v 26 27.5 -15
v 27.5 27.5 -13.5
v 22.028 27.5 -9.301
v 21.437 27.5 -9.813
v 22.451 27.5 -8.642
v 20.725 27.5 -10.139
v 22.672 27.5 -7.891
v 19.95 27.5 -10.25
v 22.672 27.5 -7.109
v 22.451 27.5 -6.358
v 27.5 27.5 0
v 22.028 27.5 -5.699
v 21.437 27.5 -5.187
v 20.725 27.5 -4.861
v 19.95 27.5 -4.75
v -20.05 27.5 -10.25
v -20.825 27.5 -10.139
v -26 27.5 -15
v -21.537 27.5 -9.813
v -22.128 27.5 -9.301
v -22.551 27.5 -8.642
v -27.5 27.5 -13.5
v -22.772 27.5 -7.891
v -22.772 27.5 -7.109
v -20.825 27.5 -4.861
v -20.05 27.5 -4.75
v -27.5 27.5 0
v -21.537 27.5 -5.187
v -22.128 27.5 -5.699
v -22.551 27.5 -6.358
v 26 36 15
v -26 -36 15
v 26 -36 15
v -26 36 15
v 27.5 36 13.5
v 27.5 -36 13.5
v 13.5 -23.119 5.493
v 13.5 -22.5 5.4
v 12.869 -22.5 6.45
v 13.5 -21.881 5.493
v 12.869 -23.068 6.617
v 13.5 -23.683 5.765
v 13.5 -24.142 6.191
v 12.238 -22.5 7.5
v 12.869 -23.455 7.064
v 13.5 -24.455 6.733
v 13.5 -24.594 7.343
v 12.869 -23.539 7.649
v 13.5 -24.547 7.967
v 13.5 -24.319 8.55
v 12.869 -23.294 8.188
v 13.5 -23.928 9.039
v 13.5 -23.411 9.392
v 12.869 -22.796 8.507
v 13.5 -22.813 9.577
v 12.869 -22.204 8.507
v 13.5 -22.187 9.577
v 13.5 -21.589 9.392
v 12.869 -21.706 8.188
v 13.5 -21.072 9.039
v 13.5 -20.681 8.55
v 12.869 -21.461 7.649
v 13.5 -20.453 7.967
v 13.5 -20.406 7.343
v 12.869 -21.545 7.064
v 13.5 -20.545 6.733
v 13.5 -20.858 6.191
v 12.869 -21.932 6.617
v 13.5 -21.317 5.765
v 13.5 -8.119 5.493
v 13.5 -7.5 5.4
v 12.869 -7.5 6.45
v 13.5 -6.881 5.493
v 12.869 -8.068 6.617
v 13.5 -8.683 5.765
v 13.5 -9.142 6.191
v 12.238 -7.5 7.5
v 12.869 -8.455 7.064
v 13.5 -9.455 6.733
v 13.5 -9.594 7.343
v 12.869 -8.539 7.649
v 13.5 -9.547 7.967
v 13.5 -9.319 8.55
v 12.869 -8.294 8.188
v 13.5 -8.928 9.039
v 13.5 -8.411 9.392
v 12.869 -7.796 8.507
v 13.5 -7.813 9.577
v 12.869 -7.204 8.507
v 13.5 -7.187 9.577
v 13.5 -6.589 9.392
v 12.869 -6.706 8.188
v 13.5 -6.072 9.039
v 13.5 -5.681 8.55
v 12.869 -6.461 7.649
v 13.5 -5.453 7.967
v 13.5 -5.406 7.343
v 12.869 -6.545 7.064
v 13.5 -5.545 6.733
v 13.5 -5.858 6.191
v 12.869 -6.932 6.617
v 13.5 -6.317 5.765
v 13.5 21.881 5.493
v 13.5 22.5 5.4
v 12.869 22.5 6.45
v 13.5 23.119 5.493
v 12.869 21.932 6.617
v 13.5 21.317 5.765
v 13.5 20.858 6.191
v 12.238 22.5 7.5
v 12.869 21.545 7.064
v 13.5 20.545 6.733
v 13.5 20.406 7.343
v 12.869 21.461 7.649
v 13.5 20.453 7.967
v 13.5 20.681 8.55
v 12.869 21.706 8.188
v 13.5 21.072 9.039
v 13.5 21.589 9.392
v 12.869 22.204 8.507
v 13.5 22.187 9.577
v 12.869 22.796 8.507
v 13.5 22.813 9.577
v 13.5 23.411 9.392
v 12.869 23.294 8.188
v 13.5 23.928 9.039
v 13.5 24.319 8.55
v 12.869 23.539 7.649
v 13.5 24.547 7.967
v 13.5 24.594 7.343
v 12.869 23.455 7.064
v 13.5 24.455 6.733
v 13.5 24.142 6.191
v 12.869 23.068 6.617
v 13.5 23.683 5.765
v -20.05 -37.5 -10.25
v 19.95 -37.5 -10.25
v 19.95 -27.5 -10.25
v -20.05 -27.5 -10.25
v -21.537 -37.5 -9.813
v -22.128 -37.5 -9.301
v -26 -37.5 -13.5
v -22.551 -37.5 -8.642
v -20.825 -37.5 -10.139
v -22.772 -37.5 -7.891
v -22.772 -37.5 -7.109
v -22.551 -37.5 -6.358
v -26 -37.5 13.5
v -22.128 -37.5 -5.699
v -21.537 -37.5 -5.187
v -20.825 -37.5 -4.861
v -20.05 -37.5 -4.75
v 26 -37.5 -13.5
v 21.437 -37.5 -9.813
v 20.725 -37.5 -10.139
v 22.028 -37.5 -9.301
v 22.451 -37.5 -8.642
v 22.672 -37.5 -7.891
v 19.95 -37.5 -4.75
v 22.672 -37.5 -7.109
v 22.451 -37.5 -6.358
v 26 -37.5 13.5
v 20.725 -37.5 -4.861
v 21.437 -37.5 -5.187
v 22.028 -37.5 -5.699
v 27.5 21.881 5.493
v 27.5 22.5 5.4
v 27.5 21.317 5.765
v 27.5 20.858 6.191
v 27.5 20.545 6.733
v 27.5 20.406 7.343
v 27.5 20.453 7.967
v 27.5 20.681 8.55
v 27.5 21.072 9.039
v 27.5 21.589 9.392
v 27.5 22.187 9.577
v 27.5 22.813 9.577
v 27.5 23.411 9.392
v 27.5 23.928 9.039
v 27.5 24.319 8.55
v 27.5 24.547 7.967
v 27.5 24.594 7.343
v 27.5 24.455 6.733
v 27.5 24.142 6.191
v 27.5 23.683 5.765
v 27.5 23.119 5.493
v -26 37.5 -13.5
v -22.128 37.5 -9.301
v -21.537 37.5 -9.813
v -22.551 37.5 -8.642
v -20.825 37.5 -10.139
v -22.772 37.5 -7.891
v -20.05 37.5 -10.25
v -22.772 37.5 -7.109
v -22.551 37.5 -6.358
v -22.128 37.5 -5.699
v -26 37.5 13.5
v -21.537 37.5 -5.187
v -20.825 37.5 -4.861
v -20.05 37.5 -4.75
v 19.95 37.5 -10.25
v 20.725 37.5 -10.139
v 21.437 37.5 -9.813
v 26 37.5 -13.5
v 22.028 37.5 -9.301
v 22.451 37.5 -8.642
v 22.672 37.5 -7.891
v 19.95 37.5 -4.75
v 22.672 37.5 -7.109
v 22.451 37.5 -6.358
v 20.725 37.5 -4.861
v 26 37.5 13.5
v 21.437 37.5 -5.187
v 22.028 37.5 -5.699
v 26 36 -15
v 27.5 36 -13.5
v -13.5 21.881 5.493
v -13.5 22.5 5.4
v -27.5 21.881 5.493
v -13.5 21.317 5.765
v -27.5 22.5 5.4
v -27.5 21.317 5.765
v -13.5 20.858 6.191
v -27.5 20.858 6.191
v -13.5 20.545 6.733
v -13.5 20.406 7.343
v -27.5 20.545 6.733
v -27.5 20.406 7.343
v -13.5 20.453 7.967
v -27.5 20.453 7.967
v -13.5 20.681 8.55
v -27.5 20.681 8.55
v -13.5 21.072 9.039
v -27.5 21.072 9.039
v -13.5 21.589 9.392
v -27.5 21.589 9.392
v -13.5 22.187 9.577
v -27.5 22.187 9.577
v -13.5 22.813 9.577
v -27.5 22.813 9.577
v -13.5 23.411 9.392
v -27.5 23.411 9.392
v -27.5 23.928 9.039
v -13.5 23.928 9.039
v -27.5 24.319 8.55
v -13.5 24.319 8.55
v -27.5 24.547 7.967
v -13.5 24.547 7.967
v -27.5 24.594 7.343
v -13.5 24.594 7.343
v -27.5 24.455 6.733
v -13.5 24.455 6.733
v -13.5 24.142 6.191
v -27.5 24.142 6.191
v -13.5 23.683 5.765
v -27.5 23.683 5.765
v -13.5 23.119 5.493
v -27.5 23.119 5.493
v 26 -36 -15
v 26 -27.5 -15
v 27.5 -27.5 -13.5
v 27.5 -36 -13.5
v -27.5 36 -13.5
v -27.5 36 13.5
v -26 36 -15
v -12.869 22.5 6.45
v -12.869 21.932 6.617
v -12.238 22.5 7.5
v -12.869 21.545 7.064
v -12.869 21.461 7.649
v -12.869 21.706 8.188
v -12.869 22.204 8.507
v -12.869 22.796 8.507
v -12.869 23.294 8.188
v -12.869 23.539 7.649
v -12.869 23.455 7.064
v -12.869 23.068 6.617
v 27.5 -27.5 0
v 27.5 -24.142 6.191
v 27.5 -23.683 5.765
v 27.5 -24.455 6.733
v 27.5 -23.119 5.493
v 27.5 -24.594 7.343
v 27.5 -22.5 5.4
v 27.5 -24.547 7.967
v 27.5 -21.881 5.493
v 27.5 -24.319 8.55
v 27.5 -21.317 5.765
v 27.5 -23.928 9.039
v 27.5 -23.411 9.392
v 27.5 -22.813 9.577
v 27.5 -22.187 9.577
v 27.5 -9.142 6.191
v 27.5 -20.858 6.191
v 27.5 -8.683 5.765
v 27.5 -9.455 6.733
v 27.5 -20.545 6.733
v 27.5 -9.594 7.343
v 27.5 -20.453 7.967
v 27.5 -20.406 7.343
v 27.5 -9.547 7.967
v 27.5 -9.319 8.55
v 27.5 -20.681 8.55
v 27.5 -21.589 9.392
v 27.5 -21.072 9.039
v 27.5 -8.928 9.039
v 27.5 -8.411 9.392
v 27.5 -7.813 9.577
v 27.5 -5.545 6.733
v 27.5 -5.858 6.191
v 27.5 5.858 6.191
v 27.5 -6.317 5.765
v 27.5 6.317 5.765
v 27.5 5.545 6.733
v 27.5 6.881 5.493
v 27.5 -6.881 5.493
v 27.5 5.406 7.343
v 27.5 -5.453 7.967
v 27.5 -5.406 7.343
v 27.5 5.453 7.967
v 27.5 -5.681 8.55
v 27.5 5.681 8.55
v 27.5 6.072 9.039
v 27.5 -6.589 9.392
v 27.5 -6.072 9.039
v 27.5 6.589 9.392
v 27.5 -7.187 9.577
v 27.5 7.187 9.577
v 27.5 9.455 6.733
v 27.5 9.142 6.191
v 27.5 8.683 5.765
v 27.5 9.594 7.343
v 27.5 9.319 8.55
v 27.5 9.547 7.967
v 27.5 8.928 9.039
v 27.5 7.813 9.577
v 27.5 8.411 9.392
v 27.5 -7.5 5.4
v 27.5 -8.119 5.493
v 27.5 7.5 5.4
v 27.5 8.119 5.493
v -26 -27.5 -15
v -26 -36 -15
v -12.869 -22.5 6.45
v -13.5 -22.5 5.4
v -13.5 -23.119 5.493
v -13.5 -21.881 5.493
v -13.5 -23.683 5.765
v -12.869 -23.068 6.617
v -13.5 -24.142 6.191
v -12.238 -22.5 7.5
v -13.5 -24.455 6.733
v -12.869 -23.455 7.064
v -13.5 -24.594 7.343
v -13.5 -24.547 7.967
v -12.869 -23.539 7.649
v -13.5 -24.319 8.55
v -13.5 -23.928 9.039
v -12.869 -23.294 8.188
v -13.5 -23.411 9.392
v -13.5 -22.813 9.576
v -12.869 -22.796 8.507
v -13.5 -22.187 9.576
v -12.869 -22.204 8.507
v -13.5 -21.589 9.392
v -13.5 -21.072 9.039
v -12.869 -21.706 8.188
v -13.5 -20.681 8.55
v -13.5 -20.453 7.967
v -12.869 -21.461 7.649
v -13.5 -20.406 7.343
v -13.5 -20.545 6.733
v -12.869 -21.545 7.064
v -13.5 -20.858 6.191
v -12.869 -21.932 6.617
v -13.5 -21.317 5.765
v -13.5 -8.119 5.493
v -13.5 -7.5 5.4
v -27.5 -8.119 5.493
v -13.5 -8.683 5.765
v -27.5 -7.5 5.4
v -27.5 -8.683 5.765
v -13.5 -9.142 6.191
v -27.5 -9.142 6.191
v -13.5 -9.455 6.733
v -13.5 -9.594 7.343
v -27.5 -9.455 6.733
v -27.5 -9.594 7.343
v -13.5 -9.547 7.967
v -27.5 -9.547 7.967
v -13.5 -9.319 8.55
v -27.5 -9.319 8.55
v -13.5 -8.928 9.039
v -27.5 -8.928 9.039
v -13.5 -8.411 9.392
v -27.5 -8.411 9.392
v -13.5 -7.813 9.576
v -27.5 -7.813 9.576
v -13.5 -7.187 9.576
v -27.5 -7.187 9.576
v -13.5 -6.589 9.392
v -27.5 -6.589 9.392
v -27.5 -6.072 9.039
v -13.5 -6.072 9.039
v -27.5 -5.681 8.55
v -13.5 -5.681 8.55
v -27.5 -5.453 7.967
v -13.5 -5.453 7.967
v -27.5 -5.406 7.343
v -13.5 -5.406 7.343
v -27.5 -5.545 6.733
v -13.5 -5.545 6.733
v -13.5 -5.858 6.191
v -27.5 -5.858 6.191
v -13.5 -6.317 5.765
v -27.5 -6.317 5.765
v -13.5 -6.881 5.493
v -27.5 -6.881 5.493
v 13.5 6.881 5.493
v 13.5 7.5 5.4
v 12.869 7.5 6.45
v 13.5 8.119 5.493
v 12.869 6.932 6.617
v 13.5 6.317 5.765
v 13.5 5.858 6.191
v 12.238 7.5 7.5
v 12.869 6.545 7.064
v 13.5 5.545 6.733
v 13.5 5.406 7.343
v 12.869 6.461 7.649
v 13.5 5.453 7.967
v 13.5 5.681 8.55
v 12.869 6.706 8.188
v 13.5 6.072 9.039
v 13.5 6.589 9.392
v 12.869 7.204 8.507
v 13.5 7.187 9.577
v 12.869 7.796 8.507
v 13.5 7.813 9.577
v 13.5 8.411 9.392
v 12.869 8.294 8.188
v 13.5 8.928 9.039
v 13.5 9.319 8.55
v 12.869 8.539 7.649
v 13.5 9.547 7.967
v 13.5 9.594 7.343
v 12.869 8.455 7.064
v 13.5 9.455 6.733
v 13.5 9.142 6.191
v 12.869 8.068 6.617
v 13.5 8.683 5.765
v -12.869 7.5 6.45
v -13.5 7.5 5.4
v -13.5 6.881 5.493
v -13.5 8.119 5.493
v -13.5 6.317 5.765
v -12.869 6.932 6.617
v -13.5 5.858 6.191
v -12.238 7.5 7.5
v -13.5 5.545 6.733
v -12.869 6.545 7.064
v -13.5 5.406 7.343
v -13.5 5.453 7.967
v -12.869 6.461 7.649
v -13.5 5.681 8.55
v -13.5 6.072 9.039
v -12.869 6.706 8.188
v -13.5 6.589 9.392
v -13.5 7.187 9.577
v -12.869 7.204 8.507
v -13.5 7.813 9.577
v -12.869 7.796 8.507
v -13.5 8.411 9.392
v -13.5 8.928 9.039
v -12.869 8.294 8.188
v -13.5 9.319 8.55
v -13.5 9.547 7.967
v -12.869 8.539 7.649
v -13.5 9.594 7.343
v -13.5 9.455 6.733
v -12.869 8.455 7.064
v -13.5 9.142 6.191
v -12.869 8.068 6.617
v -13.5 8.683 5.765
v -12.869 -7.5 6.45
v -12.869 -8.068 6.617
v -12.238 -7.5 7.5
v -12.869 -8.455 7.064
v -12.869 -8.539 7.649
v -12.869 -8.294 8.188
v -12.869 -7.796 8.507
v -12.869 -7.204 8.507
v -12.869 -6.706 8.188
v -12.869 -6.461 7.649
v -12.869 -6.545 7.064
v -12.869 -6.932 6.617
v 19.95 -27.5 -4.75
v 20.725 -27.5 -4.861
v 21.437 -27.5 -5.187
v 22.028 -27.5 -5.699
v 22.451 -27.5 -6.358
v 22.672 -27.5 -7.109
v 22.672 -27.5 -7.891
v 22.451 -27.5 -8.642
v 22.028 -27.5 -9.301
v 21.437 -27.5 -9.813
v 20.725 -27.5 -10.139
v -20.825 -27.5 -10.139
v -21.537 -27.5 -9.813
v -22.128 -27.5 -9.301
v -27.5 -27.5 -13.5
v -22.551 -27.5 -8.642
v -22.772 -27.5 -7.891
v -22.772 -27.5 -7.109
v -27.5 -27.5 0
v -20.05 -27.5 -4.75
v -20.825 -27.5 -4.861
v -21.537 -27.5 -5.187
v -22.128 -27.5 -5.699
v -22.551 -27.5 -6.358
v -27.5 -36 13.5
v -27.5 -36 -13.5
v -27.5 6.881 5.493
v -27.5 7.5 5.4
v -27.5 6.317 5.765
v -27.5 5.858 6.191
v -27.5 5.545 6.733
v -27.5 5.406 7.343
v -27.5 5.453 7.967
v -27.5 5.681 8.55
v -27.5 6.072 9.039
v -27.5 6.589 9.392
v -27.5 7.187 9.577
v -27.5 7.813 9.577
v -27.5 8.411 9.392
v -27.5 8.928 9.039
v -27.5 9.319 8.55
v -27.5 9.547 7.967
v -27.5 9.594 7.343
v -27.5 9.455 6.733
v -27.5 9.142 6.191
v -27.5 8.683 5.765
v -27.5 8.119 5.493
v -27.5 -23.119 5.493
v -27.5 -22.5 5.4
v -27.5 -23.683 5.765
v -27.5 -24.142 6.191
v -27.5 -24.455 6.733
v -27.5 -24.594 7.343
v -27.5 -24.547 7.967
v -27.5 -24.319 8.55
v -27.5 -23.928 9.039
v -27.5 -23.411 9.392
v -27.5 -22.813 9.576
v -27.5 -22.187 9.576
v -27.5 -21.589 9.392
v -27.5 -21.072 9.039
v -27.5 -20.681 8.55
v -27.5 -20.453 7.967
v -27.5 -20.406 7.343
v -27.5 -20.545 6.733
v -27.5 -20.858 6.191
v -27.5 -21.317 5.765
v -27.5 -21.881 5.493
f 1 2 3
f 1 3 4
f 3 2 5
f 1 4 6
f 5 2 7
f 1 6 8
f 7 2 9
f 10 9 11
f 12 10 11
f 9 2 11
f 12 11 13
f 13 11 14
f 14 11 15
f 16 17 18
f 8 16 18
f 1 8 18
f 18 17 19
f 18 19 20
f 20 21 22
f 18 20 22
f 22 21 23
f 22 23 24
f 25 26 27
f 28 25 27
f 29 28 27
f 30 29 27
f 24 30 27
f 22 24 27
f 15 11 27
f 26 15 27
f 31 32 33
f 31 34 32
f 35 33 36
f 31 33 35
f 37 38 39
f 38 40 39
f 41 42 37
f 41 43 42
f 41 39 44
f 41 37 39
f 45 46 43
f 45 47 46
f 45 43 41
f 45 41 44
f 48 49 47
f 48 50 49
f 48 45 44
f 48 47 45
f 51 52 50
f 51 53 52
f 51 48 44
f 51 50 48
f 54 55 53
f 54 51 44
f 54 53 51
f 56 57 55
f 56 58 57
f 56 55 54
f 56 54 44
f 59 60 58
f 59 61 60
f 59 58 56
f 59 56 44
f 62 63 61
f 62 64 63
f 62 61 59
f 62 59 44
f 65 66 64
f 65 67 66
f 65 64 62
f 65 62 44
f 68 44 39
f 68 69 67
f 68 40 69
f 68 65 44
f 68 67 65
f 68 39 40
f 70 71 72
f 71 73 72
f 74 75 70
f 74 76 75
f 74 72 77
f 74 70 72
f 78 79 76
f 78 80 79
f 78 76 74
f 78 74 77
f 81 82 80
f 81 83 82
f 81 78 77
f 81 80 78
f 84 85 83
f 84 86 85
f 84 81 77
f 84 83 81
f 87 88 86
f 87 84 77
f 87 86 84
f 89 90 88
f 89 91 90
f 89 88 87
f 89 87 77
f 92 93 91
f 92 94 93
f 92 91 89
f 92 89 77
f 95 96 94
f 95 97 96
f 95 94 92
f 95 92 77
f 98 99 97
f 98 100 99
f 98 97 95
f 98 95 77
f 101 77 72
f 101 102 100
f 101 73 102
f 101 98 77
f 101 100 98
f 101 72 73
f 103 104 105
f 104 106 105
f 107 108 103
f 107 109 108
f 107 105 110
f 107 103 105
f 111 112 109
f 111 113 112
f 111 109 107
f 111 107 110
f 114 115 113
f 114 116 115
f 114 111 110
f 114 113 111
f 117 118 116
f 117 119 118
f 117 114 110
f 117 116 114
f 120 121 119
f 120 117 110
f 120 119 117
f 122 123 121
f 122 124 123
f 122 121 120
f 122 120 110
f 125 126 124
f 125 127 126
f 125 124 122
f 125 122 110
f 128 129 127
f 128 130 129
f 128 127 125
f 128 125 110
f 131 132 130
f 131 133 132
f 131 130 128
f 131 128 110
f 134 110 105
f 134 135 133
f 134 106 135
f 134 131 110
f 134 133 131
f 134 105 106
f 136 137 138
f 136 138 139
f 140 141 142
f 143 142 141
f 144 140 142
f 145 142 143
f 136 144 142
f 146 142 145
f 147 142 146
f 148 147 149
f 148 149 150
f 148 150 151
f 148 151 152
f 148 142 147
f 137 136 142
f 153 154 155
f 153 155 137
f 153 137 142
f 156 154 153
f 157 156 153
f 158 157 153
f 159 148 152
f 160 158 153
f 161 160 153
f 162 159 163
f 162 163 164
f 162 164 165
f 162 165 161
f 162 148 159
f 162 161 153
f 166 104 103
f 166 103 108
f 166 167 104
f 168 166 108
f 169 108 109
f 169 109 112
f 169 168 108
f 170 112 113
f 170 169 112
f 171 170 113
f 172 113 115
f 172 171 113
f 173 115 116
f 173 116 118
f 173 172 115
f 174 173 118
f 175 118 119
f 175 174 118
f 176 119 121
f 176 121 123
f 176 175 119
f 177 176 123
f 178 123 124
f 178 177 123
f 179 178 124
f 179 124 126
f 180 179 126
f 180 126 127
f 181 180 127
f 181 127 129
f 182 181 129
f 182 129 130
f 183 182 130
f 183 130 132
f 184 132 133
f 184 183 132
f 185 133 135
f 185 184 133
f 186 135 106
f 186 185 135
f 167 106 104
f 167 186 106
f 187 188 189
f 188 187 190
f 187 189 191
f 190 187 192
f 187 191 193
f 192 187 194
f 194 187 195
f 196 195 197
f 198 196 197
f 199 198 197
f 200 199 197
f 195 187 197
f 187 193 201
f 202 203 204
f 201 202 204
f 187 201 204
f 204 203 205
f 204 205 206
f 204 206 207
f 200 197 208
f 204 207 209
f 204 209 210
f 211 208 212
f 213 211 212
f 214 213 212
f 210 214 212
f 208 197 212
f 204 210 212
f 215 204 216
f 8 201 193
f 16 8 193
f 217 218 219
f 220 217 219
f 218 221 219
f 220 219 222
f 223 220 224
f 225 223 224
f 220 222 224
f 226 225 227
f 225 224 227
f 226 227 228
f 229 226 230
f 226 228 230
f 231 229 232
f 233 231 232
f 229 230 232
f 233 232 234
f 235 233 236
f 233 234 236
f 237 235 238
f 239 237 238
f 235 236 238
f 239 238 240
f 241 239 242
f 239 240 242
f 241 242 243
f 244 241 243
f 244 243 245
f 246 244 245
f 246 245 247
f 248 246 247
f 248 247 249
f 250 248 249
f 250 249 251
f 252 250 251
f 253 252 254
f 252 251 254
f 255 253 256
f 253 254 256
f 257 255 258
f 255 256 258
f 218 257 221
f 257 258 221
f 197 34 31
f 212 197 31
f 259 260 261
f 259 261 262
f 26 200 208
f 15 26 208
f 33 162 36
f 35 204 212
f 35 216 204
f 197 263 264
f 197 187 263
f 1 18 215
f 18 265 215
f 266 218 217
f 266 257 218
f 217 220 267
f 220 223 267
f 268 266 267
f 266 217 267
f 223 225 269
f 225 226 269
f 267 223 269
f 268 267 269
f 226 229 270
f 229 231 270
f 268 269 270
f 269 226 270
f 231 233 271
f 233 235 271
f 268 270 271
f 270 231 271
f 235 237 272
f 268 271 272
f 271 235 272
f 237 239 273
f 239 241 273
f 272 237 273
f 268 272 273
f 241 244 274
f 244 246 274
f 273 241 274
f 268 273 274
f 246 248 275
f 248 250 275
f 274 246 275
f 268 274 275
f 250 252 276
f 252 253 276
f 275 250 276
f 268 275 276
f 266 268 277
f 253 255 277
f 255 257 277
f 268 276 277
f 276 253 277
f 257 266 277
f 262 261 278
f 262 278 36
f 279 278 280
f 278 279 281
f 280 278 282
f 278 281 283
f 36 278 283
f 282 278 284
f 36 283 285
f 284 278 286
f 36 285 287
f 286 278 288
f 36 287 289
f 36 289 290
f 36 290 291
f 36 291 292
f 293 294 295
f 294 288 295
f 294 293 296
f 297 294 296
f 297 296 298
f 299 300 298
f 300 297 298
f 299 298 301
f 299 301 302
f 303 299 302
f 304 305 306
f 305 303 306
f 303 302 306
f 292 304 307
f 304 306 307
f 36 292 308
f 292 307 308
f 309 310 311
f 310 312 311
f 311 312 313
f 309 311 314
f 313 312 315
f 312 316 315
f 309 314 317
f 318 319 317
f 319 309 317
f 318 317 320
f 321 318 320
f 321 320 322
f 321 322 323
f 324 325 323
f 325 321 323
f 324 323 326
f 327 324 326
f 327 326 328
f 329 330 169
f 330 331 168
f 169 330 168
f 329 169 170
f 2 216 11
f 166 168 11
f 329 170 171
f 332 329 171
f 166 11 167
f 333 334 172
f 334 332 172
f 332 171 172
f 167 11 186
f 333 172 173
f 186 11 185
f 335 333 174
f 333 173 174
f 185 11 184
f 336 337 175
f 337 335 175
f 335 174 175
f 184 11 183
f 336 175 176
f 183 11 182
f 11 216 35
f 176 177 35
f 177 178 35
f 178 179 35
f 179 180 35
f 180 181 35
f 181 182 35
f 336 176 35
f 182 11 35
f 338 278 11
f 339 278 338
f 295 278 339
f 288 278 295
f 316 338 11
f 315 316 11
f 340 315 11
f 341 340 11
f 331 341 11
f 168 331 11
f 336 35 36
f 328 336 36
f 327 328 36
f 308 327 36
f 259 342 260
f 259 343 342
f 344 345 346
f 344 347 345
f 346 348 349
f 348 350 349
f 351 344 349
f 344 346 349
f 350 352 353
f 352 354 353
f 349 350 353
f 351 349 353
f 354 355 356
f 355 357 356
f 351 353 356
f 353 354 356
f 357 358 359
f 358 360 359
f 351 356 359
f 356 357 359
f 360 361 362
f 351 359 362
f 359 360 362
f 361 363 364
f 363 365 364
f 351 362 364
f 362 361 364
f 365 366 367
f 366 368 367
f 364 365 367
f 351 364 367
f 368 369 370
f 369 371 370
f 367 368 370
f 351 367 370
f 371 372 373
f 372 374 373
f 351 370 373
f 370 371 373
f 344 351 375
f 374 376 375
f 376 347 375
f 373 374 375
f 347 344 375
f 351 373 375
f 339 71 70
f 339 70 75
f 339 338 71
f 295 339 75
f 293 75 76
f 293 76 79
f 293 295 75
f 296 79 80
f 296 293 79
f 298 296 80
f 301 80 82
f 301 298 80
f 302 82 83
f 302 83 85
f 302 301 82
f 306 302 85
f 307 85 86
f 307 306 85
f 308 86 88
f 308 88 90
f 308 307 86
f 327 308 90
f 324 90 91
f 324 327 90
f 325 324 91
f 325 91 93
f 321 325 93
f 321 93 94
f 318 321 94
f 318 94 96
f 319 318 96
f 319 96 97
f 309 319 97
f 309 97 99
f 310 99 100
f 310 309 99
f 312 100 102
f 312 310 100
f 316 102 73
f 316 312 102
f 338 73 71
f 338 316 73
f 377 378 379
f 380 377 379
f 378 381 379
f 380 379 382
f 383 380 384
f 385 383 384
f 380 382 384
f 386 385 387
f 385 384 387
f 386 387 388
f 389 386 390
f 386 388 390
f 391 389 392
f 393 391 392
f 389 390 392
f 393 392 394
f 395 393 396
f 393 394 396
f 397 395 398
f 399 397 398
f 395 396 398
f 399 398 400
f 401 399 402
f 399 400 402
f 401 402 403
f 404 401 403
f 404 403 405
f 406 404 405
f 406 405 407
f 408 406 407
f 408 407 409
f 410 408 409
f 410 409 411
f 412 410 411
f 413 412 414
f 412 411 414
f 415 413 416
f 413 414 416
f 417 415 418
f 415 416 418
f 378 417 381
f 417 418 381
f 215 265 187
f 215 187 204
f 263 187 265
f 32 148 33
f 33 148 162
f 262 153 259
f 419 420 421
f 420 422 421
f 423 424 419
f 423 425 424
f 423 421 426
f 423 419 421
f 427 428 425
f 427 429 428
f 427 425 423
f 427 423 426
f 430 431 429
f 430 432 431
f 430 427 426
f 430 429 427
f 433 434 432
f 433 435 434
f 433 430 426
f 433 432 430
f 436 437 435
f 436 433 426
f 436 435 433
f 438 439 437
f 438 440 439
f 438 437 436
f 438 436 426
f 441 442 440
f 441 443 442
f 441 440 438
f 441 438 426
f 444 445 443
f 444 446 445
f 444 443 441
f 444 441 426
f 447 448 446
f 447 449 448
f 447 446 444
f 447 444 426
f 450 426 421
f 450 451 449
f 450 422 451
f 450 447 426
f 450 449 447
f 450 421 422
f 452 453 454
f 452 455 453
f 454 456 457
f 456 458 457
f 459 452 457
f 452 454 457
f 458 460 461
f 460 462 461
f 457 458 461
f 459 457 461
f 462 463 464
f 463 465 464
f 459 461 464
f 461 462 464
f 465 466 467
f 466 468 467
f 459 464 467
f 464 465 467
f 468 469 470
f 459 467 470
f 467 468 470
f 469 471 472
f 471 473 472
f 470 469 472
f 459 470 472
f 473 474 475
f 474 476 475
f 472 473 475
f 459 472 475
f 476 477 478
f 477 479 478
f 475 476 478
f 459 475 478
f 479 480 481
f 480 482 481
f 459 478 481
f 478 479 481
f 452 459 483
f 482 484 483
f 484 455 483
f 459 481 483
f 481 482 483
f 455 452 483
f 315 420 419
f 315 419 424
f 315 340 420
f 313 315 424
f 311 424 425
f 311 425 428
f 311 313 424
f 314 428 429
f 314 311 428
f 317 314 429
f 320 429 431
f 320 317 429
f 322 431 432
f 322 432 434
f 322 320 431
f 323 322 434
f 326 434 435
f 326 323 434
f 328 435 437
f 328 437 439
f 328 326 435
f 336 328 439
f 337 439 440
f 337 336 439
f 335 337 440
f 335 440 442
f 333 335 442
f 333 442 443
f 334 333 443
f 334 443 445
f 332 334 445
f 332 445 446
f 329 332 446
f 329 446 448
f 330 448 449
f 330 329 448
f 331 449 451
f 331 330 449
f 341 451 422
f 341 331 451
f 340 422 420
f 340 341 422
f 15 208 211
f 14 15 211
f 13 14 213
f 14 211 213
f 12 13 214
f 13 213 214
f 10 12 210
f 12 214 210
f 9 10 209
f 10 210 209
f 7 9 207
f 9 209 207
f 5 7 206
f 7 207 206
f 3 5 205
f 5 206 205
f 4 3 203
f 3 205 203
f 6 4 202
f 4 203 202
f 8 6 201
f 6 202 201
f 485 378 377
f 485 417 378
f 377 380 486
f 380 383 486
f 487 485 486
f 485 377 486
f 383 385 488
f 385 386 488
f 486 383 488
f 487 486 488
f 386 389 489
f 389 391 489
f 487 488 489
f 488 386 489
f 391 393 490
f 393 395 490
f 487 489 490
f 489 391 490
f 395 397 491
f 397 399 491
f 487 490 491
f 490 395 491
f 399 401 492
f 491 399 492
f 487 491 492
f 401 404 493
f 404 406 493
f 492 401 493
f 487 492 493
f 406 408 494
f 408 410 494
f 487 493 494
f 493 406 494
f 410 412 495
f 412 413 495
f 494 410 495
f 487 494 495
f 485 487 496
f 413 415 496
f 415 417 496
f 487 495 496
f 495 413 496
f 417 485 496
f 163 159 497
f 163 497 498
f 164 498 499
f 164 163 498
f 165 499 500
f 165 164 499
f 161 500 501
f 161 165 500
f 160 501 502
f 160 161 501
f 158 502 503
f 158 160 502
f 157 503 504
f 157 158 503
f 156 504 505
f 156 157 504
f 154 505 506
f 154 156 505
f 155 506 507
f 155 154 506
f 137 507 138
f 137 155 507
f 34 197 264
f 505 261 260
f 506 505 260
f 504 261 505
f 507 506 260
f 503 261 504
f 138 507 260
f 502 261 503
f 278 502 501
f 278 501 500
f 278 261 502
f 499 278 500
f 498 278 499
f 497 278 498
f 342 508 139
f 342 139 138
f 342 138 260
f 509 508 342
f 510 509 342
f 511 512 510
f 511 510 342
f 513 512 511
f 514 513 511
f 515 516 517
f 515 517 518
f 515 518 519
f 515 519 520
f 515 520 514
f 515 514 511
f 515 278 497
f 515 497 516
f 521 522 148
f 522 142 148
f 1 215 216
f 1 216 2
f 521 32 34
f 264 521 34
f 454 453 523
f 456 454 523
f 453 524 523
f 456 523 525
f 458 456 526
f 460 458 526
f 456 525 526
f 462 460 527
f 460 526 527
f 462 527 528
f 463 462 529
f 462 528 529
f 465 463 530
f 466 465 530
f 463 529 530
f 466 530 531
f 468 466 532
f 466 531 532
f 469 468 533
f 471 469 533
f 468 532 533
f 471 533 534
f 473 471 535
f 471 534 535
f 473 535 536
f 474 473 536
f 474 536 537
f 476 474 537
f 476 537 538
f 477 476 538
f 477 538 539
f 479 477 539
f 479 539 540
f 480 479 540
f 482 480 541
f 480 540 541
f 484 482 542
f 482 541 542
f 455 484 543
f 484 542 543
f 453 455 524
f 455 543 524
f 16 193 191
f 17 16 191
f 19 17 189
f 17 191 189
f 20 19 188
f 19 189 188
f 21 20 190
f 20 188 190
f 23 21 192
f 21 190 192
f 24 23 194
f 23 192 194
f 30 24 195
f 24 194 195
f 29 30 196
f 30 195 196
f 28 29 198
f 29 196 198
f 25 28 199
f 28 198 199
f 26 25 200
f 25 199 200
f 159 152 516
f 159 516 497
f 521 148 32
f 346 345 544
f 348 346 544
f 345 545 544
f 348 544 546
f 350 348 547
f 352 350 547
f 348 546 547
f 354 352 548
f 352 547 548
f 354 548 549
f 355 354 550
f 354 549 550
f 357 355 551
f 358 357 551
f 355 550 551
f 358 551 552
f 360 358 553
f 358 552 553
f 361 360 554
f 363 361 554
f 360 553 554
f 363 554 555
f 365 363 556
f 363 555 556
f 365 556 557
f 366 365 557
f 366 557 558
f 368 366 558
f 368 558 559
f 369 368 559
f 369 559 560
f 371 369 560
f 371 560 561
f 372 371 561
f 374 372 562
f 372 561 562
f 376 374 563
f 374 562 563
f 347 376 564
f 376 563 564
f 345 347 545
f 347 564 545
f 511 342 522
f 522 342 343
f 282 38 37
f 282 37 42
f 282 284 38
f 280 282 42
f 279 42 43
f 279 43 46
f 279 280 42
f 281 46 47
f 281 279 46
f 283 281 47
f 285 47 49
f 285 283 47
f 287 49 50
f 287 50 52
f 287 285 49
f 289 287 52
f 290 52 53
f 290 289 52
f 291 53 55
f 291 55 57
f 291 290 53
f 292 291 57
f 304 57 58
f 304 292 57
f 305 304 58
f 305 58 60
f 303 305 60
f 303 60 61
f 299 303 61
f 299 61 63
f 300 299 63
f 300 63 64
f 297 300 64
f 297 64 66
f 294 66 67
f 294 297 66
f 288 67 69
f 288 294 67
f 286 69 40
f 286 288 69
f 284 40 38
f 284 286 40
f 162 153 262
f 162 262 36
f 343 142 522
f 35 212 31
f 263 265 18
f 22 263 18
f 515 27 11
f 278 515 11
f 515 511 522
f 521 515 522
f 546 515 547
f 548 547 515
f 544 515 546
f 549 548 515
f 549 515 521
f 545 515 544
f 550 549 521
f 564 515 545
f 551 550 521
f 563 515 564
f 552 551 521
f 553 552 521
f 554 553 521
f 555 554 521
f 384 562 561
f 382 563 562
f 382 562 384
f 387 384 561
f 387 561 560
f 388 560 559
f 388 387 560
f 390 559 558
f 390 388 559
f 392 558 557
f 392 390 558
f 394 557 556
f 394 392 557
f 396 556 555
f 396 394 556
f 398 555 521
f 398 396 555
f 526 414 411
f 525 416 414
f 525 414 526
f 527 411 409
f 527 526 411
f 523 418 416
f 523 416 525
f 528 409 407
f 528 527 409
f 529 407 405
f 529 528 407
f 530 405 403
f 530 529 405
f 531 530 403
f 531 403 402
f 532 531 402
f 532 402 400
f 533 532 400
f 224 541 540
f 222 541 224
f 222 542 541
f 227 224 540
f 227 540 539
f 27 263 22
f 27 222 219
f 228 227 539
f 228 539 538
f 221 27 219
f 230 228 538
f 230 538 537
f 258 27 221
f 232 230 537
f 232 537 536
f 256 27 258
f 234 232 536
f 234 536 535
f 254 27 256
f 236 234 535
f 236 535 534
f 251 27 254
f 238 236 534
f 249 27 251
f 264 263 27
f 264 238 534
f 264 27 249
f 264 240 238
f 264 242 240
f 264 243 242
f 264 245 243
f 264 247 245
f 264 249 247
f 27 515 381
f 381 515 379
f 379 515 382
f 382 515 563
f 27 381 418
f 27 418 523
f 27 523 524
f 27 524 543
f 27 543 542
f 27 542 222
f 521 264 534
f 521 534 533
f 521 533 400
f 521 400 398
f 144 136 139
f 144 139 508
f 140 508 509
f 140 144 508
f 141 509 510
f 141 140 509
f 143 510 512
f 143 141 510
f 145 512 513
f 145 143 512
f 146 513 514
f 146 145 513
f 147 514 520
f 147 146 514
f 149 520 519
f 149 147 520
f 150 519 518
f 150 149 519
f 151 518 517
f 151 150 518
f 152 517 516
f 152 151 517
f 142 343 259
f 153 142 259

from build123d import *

# Parameters (mm, degrees)
SKETCH1_W                  = 55
SKETCH1_H                  = 65
BOSS_EXTRUDE1_DEPTH        = 10
SKETCH2_W                  = 55
SKETCH2_H                  = 5
BOSS_EXTRUDE2_DEPTH        = 15
CUT_EXTRUDE1_DEPTH         = 104
SKETCH4_W                  = 55
SKETCH4_H                  = 65
BOSS_EXTRUDE3_DEPTH        = 5
M5_TAPPED_HOLE2_AT_2_COUNT = 2
M5_TAPPED_HOLE2_AT_2_PITCH = 15
M5_TAPPED_HOLE2_AT_3_COUNT = 2
M5_TAPPED_HOLE2_AT_3_PITCH = 30
M5_TAPPED_HOLE2_AT_4_COUNT = 2
M5_TAPPED_HOLE2_AT_4_PITCH = 45
BOSS_EXTRUDE4_START        = 5
SKETCH13_W                 = 55
SKETCH13_H                 = 30
BOSS_EXTRUDE4_DEPTH        = 5
CHAMFER2_SIZE              = 1.5


with BuildPart() as part:
    # Sketch1 → Boss-Extrude1 (new body)
    with BuildSketch(Plane.XY):
        Rectangle(SKETCH1_W, SKETCH1_H)
    extrude(amount=BOSS_EXTRUDE1_DEPTH)

    # Sketch2 → Boss-Extrude2 (add)
    with BuildSketch(Plane(origin=(0, 0, 0), x_dir=(-1, 0, 0), z_dir=(0, 0, -1))):
        with Locations((0, 30)):
            Rectangle(SKETCH2_W, SKETCH2_H)
        with Locations((0, -30)):
            Rectangle(SKETCH2_W, SKETCH2_H)
    extrude(amount=BOSS_EXTRUDE2_DEPTH)

    # Sketch3 → Cut-Extrude1 (cut)
    with BuildSketch(Plane.XZ.offset(32.5)):
        with BuildLine():
            Line((-20.05, -4.75), (19.95, -4.75))
            ThreePointArc((19.95, -4.75), (22.7, -7.5), (19.95, -10.25))
            Line((19.95, -10.25), (-20.05, -10.25))
            ThreePointArc((-20.05, -10.25), (-22.8, -7.5), (-20.05, -4.75))
        make_face()
    extrude(amount=-CUT_EXTRUDE1_DEPTH, mode=Mode.SUBTRACT)

    # Sketch4 → Boss-Extrude3 (add)
    with BuildSketch(Plane.XY.offset(10)):
        Rectangle(SKETCH4_W, SKETCH4_H)
    extrude(amount=BOSS_EXTRUDE3_DEPTH)

    # Sketch12 → M5 Tapped Hole2 (revolve, cut)
    with BuildSketch(Plane(origin=(27.5, 22.5, 7.5), x_dir=(0, 0, -1), z_dir=(0, 1, 0))):
        Polygon((0, 0), (0, 15.2618073), (2.1, 14), (2.1, 0), align=None)
    m5_tapped_hole2 = revolve(axis=Axis((33.85, 22.5, 7.5), (-1, 0, 0)), mode=Mode.SUBTRACT)

    # M5 Tapped Hole2 at 2: M5 Tapped Hole2 ×2
    with Locations(*[(0, -i * M5_TAPPED_HOLE2_AT_2_PITCH, 0) for i in range(1, M5_TAPPED_HOLE2_AT_2_COUNT)]):
        add(m5_tapped_hole2, mode=Mode.SUBTRACT)

    # M5 Tapped Hole2 at 3: M5 Tapped Hole2 ×2
    with Locations(*[(0, -i * M5_TAPPED_HOLE2_AT_3_PITCH, 0) for i in range(1, M5_TAPPED_HOLE2_AT_3_COUNT)]):
        add(m5_tapped_hole2, mode=Mode.SUBTRACT)

    # M5 Tapped Hole2 at 4: M5 Tapped Hole2 ×2
    with Locations(*[(0, -i * M5_TAPPED_HOLE2_AT_4_PITCH, 0) for i in range(1, M5_TAPPED_HOLE2_AT_4_COUNT)]):
        add(m5_tapped_hole2, mode=Mode.SUBTRACT)

    # Mirror2: M5 Tapped Hole2 across plane
    add(m5_tapped_hole2.mirror(Plane(origin=(0, 0, 0), x_dir=(0, 0, 1), z_dir=(1, 0, 0))), mode=Mode.SUBTRACT)

    # Mirror2 copy 1 sketch → Mirror2 copy 1 (revolve, cut)
    with BuildSketch(Plane(origin=(-27.5, 7.5, 7.499975629), x_dir=(0, 0, -1), z_dir=(0, 1, 0))):
        Polygon((0, 0), (0, -15.2618073), (2.1, -14), (2.1, 0), align=None)
    revolve(axis=Axis((-33.85, 7.5, 7.499975629), (-1, 0, 0)), mode=Mode.SUBTRACT)

    # Mirror2 copy 2 sketch → Mirror2 copy 2 (revolve, cut)
    with BuildSketch(Plane(origin=(-27.5, -7.5, 7.499949533), x_dir=(0, 0, -1), z_dir=(0, 1, 0))):
        Polygon((0, 0), (0, -15.2618073), (2.1, -14), (2.1, 0), align=None)
    revolve(axis=Axis((-33.85, -7.5, 7.499949533), (-1, 0, 0)), mode=Mode.SUBTRACT)

    # Mirror2 copy 3 sketch → Mirror2 copy 3 (revolve, cut)
    with BuildSketch(Plane(origin=(-27.5, -22.5, 7.499923436), x_dir=(0, 0, -1), z_dir=(0, 1, 0))):
        Polygon((0, 0), (0, -15.2618073), (2.1, -14), (2.1, 0), align=None)
    revolve(axis=Axis((-33.85, -22.5, 7.499923436), (-1, 0, 0)), mode=Mode.SUBTRACT)

    # Sketch13 → Boss-Extrude4 (add)
    with BuildSketch(Plane.XZ.offset(32.5).offset(BOSS_EXTRUDE4_START)):
        Rectangle(SKETCH13_W, SKETCH13_H)
        with BuildLine():
            Line((-20.05, -4.75), (19.95, -4.75))
            ThreePointArc((19.95, -4.75), (22.7, -7.5), (19.95, -10.25))
            Line((19.95, -10.25), (-20.05, -10.25))
            ThreePointArc((-20.05, -10.25), (-22.8, -7.5), (-20.05, -4.75))
        make_face(mode=Mode.SUBTRACT)
    boss_extrude4 = extrude(amount=-BOSS_EXTRUDE4_DEPTH)

    # Mirror3: Boss-Extrude4 across plane
    add(boss_extrude4.mirror(Plane(origin=(0, 0, 0), x_dir=(0, 0, 1), z_dir=(0, -1, 0))))

    # Chamfer2
    chamfer2_edges = [part.edges().sort_by_distance(p)[0] for p in [
        (-27.5, -37.5, 0),
        (0, -37.5, -15),
        (27.5, -37.5, 0),
        (0, -37.5, 15),
        (-27.5, 37.5, 0),
        (0, 37.5, 15),
        (27.5, 37.5, 0),
        (0, 37.5, -15),
        (27.5, 32.5, -15),
        (-27.5, 32.5, -15),
        (27.5, -32.5, -15),
        (-27.5, -32.5, -15),
        (-27.5, 0, 15),
        (27.5, 0, 15),
    ]]
    chamfer(chamfer2_edges, length=CHAMFER2_SIZE)


solid = part.part
